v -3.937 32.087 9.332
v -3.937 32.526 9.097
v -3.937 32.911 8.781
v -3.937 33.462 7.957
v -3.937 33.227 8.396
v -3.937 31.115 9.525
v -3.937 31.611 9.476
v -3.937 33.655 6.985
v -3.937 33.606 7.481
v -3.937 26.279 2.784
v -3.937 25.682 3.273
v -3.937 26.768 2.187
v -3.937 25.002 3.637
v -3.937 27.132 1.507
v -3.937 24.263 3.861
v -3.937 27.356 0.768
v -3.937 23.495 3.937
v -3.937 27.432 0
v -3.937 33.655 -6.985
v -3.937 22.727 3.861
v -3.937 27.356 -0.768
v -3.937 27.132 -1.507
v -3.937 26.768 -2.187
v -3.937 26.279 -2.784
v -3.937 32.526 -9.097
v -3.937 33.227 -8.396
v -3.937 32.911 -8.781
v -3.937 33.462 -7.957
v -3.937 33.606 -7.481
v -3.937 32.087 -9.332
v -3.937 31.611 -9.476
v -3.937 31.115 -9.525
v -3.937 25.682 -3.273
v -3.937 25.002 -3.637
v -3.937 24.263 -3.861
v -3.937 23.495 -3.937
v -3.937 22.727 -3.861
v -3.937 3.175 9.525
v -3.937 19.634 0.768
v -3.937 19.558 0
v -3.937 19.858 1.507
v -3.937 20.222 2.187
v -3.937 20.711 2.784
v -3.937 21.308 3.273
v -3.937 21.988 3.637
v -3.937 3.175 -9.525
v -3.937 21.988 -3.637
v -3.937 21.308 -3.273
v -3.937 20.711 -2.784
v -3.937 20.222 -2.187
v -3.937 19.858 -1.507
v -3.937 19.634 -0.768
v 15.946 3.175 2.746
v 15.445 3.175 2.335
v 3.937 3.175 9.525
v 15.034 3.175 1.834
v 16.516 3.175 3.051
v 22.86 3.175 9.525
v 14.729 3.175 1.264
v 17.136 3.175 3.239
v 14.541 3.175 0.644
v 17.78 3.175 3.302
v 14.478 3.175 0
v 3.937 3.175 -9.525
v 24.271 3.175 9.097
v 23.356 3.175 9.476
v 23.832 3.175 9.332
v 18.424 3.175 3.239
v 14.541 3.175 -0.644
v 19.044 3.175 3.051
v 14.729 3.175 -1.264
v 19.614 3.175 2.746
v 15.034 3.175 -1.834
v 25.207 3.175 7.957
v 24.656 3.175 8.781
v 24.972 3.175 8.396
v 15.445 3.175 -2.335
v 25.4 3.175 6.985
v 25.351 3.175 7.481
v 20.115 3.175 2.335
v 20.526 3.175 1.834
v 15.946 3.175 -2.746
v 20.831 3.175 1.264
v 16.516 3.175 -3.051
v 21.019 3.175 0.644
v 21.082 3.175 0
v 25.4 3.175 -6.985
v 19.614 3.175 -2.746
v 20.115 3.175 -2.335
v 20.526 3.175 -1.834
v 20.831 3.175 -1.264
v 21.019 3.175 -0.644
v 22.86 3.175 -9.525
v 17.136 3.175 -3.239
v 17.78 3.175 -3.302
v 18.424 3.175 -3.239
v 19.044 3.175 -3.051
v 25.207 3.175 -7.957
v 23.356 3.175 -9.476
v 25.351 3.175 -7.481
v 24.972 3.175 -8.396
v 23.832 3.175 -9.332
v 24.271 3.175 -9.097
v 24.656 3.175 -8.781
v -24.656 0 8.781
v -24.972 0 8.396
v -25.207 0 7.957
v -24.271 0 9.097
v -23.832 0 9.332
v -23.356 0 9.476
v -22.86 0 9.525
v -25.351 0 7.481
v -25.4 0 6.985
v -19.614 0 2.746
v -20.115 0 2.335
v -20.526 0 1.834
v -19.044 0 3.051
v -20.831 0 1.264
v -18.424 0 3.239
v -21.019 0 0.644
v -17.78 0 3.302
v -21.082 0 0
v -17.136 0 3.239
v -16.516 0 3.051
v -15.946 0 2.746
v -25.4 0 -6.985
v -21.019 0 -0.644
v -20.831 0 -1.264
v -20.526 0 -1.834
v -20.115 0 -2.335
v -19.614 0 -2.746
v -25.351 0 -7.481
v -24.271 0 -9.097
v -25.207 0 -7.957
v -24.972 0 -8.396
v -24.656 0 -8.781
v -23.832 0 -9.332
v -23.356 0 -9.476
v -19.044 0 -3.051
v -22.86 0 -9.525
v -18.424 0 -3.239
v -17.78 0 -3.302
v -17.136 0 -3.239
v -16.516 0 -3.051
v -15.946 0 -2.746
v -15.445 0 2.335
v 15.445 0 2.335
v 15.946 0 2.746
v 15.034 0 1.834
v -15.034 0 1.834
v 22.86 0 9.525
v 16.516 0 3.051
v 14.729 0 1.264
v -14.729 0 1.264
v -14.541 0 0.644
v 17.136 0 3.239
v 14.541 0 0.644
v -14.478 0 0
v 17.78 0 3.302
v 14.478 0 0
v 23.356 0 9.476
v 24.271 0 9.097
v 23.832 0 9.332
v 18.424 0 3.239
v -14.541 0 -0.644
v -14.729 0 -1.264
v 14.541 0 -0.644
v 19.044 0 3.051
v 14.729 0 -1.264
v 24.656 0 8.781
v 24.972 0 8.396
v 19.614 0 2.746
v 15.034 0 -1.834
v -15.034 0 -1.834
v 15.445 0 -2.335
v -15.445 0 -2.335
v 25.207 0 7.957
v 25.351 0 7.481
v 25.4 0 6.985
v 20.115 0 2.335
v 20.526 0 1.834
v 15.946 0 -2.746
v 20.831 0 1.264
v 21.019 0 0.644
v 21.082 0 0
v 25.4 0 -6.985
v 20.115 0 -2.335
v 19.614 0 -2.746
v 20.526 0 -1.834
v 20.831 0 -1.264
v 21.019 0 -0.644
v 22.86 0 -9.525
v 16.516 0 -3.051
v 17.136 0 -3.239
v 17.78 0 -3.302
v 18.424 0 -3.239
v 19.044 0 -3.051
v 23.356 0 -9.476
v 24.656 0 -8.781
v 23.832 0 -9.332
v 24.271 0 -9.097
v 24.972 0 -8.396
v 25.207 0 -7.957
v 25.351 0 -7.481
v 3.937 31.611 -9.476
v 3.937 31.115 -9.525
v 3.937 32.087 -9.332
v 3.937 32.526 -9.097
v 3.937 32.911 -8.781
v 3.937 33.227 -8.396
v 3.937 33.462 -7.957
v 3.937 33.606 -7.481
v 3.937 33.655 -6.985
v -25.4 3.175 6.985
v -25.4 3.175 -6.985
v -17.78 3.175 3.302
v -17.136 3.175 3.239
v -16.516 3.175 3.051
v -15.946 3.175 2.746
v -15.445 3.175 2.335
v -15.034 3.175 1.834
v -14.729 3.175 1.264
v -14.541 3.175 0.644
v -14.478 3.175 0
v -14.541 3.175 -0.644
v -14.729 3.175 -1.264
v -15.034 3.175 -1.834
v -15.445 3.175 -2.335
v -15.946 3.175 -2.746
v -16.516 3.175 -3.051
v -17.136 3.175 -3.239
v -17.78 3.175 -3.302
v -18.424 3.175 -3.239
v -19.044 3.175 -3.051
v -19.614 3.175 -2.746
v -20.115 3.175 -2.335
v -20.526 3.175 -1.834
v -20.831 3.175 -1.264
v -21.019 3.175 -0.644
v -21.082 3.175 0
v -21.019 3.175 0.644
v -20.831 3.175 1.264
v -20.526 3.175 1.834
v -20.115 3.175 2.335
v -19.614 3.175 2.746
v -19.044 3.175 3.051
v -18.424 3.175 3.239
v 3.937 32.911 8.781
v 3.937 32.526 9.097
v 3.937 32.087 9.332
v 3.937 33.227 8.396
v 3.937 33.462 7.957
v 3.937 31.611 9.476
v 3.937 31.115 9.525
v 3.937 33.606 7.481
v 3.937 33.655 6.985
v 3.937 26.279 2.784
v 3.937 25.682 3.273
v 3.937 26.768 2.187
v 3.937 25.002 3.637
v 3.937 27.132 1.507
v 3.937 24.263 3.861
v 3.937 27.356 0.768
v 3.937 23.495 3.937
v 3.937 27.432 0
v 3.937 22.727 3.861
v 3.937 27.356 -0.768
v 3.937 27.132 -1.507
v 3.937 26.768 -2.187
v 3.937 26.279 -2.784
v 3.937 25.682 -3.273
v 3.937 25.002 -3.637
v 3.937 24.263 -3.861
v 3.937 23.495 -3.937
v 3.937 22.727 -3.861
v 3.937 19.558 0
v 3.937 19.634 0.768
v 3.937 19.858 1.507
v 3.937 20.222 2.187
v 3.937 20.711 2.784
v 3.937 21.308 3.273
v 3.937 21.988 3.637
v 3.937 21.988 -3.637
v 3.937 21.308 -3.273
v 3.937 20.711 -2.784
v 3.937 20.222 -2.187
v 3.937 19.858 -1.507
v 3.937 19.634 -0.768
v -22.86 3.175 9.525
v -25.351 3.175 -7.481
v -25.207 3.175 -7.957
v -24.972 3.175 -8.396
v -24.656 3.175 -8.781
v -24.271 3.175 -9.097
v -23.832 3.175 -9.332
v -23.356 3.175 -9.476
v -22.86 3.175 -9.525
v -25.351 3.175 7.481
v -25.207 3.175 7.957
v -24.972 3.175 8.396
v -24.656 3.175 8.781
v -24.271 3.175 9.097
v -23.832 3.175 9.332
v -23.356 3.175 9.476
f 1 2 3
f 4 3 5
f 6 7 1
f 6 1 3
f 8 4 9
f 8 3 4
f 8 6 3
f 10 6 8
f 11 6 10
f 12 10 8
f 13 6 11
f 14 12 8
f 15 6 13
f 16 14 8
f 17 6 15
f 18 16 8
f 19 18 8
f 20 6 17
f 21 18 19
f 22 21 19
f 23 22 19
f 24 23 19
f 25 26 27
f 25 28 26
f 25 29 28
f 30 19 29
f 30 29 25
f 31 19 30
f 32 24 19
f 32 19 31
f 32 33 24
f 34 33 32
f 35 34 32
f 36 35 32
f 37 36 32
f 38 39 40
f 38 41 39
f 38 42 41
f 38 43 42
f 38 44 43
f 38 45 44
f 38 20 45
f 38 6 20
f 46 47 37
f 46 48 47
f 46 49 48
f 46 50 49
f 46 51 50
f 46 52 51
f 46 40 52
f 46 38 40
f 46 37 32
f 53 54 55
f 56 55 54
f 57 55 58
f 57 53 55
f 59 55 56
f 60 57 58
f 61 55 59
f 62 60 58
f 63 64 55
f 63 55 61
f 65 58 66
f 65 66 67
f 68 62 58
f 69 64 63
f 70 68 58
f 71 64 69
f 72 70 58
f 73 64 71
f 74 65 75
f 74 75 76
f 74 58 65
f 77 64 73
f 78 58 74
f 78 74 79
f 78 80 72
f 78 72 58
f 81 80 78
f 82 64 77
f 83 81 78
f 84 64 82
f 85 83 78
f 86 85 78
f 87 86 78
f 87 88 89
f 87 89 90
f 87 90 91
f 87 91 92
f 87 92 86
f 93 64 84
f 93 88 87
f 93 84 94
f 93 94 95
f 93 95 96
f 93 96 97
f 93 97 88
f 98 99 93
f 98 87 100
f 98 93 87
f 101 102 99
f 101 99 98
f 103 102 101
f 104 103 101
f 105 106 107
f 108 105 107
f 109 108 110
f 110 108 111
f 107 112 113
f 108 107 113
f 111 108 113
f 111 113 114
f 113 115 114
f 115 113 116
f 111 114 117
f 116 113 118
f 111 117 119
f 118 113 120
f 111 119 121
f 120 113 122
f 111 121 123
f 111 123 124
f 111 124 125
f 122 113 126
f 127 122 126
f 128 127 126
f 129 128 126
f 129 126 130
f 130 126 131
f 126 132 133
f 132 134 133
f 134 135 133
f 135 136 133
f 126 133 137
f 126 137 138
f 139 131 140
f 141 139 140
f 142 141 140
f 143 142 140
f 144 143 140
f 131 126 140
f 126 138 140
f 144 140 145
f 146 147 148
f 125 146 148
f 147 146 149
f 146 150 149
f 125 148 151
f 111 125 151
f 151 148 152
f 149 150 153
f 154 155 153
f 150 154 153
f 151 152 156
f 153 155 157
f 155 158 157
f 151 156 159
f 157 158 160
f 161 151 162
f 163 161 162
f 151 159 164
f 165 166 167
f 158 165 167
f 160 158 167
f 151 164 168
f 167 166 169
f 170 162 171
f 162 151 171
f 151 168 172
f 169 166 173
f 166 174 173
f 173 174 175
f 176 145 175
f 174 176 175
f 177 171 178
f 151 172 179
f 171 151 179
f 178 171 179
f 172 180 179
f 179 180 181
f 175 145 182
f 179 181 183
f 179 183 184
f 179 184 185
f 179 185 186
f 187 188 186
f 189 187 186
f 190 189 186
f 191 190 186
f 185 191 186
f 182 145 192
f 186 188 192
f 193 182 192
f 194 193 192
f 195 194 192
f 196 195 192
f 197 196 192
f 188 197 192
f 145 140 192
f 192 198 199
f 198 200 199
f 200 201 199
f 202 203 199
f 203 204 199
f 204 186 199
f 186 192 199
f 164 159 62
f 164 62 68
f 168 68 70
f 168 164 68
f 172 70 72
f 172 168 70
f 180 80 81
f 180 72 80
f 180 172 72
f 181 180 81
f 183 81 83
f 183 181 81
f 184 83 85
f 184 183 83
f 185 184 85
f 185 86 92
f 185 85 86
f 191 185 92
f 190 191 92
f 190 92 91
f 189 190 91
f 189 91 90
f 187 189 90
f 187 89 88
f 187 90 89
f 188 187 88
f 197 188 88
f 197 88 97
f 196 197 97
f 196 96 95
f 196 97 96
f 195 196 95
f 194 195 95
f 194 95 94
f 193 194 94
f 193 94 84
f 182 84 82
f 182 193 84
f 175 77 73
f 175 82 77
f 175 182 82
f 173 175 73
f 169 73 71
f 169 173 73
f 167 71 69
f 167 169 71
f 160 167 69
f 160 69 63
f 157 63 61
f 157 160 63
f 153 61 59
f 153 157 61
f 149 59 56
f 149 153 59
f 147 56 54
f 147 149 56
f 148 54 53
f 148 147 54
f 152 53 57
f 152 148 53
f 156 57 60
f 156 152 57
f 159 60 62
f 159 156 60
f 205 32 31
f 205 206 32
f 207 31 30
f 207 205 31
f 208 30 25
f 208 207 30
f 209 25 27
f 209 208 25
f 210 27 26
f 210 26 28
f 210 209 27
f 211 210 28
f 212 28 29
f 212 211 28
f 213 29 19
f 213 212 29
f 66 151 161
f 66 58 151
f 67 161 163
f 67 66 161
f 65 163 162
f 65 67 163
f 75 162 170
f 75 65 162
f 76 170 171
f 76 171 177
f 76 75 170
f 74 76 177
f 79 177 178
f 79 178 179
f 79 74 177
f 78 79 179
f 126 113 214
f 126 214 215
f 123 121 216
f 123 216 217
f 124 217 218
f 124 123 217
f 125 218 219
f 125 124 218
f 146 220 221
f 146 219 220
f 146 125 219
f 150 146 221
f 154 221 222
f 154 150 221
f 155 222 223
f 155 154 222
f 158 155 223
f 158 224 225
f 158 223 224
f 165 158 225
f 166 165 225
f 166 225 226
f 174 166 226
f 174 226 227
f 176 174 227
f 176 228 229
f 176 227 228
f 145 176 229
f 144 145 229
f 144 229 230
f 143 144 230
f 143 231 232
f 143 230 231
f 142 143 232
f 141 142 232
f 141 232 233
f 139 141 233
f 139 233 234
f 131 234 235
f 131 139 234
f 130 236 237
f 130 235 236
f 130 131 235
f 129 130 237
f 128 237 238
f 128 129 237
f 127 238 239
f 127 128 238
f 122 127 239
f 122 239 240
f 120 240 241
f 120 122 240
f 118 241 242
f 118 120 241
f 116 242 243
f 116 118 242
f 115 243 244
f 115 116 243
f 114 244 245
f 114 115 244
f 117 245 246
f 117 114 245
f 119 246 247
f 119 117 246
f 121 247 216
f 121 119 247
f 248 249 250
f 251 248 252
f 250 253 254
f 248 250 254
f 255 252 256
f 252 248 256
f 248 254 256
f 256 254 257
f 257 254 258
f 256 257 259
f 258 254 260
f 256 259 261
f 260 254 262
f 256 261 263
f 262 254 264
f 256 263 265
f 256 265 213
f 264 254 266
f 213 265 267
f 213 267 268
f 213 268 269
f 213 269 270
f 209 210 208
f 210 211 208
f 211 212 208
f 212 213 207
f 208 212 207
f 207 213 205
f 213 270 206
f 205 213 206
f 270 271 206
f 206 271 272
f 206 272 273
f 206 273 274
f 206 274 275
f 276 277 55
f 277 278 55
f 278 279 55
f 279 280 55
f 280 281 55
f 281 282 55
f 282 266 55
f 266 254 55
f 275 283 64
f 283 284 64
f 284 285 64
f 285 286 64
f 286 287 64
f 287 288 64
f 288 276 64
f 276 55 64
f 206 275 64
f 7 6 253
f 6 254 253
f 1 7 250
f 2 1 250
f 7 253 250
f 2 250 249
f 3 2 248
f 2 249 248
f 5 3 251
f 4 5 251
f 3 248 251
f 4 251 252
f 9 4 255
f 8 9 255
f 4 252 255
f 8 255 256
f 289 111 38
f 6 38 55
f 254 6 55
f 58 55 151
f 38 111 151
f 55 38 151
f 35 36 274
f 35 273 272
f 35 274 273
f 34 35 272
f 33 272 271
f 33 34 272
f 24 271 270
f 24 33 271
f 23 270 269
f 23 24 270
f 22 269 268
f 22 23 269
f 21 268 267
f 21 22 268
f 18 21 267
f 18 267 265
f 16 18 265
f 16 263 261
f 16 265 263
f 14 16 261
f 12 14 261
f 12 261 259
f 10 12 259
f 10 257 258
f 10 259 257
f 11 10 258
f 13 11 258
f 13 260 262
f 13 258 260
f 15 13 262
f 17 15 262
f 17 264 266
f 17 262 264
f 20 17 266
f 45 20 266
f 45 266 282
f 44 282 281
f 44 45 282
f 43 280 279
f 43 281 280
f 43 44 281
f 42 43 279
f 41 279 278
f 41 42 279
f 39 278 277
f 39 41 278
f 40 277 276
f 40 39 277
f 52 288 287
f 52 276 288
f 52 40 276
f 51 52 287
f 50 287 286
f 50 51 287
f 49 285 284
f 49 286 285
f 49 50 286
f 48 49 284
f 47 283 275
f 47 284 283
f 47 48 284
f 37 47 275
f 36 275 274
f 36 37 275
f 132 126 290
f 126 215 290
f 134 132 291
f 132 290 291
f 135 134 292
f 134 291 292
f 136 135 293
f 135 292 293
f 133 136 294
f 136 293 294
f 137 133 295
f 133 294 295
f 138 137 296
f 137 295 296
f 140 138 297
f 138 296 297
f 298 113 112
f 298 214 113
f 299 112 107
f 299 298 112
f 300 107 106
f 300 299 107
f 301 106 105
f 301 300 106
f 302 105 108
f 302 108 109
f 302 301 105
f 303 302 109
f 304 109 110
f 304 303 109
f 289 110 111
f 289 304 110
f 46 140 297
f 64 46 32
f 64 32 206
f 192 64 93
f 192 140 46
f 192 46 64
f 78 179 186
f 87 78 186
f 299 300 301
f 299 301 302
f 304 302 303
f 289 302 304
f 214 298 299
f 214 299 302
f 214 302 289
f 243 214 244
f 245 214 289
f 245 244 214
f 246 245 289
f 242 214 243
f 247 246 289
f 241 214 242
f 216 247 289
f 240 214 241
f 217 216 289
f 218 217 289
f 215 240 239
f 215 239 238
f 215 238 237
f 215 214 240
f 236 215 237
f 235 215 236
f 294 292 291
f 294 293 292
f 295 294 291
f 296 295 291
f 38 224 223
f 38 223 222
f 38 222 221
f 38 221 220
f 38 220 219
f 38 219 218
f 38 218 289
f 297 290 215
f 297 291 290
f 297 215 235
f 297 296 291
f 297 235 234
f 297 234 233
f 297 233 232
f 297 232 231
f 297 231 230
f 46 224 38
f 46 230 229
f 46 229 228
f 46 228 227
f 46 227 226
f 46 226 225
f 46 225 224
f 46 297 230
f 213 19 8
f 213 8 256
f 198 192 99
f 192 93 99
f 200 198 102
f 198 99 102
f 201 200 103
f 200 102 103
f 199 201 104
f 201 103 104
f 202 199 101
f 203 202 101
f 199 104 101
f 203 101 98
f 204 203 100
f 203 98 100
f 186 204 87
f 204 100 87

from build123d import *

# Parameters (mm, degrees)
SKETCH1_W               = 50.8
SKETCH1_H               = 19.05
BOSS_EXTRUDE1_DEPTH     = 3.175
SKETCH2_W               = 7.874
SKETCH2_H               = 19.05
BOSS_EXTRUDE2_DEPTH     = 30.48
CUT_EXTRUDE1_DEPTH      = 46.651333157
CUT_EXTRUDE1_DEPTH_BACK = 46.651333157
SKETCH3_R               = 3.937
CUT_EXTRUDE2_DEPTH      = 41.803382519
CUT_EXTRUDE2_DEPTH_BACK = 41.803382519
SKETCH5_R               = 3.302
FILLET2_R               = 2.54


with BuildPart() as part:
    # Sketch1 → Boss-Extrude1 (new body)
    with BuildSketch(Plane(origin=(0, 0, 0), x_dir=(1, 0, 0), z_dir=(0, 1, 0))):
        Rectangle(SKETCH1_W, SKETCH1_H)
    extrude(amount=BOSS_EXTRUDE1_DEPTH)

    # Sketch2 → Boss-Extrude2 (add)
    with BuildSketch(Plane(origin=(0, 3.175, 0), x_dir=(1, 0, 0), z_dir=(0, 1, 0))):
        Rectangle(SKETCH2_W, SKETCH2_H)
    extrude(amount=BOSS_EXTRUDE2_DEPTH)

    # Sketch3 → Cut-Extrude1 (cut, two sides: drawn at the far end of the back side and taken through both)
    with BuildSketch(Plane(origin=(3.937, 0, 0), x_dir=(0, 0, -1), z_dir=(1, 0, 0)).offset(-CUT_EXTRUDE1_DEPTH_BACK)):
        with Locations((0, 23.495)):
            Circle(SKETCH3_R)
    extrude(amount=CUT_EXTRUDE1_DEPTH + CUT_EXTRUDE1_DEPTH_BACK, mode=Mode.SUBTRACT)

    # Sketch5 → Cut-Extrude2 (cut, two sides: drawn at the far end of the back side and taken through both)
    with BuildSketch(Plane(origin=(0, 3.175, 0), x_dir=(1, 0, 0), z_dir=(0, 1, 0)).offset(-CUT_EXTRUDE2_DEPTH_BACK)):
        with Locations((-17.78, 0)):
            Circle(SKETCH5_R)
        with Locations((17.78, 0)):
            Circle(SKETCH5_R)
    extrude(amount=CUT_EXTRUDE2_DEPTH + CUT_EXTRUDE2_DEPTH_BACK, mode=Mode.SUBTRACT)

    # Fillet2
    fillet2_edges = [part.edges().sort_by_distance(p)[0] for p in [
        (-25.4, 1.5875, -9.525),
        (25.4, 1.5875, -9.525),
        (25.4, 1.5875, 9.525),
        (-25.4, 1.5875, 9.525),
        (0, 33.655, -9.525),
        (0, 33.655, 9.525),
    ]]
    fillet(fillet2_edges, radius=FILLET2_R)


solid = part.part
